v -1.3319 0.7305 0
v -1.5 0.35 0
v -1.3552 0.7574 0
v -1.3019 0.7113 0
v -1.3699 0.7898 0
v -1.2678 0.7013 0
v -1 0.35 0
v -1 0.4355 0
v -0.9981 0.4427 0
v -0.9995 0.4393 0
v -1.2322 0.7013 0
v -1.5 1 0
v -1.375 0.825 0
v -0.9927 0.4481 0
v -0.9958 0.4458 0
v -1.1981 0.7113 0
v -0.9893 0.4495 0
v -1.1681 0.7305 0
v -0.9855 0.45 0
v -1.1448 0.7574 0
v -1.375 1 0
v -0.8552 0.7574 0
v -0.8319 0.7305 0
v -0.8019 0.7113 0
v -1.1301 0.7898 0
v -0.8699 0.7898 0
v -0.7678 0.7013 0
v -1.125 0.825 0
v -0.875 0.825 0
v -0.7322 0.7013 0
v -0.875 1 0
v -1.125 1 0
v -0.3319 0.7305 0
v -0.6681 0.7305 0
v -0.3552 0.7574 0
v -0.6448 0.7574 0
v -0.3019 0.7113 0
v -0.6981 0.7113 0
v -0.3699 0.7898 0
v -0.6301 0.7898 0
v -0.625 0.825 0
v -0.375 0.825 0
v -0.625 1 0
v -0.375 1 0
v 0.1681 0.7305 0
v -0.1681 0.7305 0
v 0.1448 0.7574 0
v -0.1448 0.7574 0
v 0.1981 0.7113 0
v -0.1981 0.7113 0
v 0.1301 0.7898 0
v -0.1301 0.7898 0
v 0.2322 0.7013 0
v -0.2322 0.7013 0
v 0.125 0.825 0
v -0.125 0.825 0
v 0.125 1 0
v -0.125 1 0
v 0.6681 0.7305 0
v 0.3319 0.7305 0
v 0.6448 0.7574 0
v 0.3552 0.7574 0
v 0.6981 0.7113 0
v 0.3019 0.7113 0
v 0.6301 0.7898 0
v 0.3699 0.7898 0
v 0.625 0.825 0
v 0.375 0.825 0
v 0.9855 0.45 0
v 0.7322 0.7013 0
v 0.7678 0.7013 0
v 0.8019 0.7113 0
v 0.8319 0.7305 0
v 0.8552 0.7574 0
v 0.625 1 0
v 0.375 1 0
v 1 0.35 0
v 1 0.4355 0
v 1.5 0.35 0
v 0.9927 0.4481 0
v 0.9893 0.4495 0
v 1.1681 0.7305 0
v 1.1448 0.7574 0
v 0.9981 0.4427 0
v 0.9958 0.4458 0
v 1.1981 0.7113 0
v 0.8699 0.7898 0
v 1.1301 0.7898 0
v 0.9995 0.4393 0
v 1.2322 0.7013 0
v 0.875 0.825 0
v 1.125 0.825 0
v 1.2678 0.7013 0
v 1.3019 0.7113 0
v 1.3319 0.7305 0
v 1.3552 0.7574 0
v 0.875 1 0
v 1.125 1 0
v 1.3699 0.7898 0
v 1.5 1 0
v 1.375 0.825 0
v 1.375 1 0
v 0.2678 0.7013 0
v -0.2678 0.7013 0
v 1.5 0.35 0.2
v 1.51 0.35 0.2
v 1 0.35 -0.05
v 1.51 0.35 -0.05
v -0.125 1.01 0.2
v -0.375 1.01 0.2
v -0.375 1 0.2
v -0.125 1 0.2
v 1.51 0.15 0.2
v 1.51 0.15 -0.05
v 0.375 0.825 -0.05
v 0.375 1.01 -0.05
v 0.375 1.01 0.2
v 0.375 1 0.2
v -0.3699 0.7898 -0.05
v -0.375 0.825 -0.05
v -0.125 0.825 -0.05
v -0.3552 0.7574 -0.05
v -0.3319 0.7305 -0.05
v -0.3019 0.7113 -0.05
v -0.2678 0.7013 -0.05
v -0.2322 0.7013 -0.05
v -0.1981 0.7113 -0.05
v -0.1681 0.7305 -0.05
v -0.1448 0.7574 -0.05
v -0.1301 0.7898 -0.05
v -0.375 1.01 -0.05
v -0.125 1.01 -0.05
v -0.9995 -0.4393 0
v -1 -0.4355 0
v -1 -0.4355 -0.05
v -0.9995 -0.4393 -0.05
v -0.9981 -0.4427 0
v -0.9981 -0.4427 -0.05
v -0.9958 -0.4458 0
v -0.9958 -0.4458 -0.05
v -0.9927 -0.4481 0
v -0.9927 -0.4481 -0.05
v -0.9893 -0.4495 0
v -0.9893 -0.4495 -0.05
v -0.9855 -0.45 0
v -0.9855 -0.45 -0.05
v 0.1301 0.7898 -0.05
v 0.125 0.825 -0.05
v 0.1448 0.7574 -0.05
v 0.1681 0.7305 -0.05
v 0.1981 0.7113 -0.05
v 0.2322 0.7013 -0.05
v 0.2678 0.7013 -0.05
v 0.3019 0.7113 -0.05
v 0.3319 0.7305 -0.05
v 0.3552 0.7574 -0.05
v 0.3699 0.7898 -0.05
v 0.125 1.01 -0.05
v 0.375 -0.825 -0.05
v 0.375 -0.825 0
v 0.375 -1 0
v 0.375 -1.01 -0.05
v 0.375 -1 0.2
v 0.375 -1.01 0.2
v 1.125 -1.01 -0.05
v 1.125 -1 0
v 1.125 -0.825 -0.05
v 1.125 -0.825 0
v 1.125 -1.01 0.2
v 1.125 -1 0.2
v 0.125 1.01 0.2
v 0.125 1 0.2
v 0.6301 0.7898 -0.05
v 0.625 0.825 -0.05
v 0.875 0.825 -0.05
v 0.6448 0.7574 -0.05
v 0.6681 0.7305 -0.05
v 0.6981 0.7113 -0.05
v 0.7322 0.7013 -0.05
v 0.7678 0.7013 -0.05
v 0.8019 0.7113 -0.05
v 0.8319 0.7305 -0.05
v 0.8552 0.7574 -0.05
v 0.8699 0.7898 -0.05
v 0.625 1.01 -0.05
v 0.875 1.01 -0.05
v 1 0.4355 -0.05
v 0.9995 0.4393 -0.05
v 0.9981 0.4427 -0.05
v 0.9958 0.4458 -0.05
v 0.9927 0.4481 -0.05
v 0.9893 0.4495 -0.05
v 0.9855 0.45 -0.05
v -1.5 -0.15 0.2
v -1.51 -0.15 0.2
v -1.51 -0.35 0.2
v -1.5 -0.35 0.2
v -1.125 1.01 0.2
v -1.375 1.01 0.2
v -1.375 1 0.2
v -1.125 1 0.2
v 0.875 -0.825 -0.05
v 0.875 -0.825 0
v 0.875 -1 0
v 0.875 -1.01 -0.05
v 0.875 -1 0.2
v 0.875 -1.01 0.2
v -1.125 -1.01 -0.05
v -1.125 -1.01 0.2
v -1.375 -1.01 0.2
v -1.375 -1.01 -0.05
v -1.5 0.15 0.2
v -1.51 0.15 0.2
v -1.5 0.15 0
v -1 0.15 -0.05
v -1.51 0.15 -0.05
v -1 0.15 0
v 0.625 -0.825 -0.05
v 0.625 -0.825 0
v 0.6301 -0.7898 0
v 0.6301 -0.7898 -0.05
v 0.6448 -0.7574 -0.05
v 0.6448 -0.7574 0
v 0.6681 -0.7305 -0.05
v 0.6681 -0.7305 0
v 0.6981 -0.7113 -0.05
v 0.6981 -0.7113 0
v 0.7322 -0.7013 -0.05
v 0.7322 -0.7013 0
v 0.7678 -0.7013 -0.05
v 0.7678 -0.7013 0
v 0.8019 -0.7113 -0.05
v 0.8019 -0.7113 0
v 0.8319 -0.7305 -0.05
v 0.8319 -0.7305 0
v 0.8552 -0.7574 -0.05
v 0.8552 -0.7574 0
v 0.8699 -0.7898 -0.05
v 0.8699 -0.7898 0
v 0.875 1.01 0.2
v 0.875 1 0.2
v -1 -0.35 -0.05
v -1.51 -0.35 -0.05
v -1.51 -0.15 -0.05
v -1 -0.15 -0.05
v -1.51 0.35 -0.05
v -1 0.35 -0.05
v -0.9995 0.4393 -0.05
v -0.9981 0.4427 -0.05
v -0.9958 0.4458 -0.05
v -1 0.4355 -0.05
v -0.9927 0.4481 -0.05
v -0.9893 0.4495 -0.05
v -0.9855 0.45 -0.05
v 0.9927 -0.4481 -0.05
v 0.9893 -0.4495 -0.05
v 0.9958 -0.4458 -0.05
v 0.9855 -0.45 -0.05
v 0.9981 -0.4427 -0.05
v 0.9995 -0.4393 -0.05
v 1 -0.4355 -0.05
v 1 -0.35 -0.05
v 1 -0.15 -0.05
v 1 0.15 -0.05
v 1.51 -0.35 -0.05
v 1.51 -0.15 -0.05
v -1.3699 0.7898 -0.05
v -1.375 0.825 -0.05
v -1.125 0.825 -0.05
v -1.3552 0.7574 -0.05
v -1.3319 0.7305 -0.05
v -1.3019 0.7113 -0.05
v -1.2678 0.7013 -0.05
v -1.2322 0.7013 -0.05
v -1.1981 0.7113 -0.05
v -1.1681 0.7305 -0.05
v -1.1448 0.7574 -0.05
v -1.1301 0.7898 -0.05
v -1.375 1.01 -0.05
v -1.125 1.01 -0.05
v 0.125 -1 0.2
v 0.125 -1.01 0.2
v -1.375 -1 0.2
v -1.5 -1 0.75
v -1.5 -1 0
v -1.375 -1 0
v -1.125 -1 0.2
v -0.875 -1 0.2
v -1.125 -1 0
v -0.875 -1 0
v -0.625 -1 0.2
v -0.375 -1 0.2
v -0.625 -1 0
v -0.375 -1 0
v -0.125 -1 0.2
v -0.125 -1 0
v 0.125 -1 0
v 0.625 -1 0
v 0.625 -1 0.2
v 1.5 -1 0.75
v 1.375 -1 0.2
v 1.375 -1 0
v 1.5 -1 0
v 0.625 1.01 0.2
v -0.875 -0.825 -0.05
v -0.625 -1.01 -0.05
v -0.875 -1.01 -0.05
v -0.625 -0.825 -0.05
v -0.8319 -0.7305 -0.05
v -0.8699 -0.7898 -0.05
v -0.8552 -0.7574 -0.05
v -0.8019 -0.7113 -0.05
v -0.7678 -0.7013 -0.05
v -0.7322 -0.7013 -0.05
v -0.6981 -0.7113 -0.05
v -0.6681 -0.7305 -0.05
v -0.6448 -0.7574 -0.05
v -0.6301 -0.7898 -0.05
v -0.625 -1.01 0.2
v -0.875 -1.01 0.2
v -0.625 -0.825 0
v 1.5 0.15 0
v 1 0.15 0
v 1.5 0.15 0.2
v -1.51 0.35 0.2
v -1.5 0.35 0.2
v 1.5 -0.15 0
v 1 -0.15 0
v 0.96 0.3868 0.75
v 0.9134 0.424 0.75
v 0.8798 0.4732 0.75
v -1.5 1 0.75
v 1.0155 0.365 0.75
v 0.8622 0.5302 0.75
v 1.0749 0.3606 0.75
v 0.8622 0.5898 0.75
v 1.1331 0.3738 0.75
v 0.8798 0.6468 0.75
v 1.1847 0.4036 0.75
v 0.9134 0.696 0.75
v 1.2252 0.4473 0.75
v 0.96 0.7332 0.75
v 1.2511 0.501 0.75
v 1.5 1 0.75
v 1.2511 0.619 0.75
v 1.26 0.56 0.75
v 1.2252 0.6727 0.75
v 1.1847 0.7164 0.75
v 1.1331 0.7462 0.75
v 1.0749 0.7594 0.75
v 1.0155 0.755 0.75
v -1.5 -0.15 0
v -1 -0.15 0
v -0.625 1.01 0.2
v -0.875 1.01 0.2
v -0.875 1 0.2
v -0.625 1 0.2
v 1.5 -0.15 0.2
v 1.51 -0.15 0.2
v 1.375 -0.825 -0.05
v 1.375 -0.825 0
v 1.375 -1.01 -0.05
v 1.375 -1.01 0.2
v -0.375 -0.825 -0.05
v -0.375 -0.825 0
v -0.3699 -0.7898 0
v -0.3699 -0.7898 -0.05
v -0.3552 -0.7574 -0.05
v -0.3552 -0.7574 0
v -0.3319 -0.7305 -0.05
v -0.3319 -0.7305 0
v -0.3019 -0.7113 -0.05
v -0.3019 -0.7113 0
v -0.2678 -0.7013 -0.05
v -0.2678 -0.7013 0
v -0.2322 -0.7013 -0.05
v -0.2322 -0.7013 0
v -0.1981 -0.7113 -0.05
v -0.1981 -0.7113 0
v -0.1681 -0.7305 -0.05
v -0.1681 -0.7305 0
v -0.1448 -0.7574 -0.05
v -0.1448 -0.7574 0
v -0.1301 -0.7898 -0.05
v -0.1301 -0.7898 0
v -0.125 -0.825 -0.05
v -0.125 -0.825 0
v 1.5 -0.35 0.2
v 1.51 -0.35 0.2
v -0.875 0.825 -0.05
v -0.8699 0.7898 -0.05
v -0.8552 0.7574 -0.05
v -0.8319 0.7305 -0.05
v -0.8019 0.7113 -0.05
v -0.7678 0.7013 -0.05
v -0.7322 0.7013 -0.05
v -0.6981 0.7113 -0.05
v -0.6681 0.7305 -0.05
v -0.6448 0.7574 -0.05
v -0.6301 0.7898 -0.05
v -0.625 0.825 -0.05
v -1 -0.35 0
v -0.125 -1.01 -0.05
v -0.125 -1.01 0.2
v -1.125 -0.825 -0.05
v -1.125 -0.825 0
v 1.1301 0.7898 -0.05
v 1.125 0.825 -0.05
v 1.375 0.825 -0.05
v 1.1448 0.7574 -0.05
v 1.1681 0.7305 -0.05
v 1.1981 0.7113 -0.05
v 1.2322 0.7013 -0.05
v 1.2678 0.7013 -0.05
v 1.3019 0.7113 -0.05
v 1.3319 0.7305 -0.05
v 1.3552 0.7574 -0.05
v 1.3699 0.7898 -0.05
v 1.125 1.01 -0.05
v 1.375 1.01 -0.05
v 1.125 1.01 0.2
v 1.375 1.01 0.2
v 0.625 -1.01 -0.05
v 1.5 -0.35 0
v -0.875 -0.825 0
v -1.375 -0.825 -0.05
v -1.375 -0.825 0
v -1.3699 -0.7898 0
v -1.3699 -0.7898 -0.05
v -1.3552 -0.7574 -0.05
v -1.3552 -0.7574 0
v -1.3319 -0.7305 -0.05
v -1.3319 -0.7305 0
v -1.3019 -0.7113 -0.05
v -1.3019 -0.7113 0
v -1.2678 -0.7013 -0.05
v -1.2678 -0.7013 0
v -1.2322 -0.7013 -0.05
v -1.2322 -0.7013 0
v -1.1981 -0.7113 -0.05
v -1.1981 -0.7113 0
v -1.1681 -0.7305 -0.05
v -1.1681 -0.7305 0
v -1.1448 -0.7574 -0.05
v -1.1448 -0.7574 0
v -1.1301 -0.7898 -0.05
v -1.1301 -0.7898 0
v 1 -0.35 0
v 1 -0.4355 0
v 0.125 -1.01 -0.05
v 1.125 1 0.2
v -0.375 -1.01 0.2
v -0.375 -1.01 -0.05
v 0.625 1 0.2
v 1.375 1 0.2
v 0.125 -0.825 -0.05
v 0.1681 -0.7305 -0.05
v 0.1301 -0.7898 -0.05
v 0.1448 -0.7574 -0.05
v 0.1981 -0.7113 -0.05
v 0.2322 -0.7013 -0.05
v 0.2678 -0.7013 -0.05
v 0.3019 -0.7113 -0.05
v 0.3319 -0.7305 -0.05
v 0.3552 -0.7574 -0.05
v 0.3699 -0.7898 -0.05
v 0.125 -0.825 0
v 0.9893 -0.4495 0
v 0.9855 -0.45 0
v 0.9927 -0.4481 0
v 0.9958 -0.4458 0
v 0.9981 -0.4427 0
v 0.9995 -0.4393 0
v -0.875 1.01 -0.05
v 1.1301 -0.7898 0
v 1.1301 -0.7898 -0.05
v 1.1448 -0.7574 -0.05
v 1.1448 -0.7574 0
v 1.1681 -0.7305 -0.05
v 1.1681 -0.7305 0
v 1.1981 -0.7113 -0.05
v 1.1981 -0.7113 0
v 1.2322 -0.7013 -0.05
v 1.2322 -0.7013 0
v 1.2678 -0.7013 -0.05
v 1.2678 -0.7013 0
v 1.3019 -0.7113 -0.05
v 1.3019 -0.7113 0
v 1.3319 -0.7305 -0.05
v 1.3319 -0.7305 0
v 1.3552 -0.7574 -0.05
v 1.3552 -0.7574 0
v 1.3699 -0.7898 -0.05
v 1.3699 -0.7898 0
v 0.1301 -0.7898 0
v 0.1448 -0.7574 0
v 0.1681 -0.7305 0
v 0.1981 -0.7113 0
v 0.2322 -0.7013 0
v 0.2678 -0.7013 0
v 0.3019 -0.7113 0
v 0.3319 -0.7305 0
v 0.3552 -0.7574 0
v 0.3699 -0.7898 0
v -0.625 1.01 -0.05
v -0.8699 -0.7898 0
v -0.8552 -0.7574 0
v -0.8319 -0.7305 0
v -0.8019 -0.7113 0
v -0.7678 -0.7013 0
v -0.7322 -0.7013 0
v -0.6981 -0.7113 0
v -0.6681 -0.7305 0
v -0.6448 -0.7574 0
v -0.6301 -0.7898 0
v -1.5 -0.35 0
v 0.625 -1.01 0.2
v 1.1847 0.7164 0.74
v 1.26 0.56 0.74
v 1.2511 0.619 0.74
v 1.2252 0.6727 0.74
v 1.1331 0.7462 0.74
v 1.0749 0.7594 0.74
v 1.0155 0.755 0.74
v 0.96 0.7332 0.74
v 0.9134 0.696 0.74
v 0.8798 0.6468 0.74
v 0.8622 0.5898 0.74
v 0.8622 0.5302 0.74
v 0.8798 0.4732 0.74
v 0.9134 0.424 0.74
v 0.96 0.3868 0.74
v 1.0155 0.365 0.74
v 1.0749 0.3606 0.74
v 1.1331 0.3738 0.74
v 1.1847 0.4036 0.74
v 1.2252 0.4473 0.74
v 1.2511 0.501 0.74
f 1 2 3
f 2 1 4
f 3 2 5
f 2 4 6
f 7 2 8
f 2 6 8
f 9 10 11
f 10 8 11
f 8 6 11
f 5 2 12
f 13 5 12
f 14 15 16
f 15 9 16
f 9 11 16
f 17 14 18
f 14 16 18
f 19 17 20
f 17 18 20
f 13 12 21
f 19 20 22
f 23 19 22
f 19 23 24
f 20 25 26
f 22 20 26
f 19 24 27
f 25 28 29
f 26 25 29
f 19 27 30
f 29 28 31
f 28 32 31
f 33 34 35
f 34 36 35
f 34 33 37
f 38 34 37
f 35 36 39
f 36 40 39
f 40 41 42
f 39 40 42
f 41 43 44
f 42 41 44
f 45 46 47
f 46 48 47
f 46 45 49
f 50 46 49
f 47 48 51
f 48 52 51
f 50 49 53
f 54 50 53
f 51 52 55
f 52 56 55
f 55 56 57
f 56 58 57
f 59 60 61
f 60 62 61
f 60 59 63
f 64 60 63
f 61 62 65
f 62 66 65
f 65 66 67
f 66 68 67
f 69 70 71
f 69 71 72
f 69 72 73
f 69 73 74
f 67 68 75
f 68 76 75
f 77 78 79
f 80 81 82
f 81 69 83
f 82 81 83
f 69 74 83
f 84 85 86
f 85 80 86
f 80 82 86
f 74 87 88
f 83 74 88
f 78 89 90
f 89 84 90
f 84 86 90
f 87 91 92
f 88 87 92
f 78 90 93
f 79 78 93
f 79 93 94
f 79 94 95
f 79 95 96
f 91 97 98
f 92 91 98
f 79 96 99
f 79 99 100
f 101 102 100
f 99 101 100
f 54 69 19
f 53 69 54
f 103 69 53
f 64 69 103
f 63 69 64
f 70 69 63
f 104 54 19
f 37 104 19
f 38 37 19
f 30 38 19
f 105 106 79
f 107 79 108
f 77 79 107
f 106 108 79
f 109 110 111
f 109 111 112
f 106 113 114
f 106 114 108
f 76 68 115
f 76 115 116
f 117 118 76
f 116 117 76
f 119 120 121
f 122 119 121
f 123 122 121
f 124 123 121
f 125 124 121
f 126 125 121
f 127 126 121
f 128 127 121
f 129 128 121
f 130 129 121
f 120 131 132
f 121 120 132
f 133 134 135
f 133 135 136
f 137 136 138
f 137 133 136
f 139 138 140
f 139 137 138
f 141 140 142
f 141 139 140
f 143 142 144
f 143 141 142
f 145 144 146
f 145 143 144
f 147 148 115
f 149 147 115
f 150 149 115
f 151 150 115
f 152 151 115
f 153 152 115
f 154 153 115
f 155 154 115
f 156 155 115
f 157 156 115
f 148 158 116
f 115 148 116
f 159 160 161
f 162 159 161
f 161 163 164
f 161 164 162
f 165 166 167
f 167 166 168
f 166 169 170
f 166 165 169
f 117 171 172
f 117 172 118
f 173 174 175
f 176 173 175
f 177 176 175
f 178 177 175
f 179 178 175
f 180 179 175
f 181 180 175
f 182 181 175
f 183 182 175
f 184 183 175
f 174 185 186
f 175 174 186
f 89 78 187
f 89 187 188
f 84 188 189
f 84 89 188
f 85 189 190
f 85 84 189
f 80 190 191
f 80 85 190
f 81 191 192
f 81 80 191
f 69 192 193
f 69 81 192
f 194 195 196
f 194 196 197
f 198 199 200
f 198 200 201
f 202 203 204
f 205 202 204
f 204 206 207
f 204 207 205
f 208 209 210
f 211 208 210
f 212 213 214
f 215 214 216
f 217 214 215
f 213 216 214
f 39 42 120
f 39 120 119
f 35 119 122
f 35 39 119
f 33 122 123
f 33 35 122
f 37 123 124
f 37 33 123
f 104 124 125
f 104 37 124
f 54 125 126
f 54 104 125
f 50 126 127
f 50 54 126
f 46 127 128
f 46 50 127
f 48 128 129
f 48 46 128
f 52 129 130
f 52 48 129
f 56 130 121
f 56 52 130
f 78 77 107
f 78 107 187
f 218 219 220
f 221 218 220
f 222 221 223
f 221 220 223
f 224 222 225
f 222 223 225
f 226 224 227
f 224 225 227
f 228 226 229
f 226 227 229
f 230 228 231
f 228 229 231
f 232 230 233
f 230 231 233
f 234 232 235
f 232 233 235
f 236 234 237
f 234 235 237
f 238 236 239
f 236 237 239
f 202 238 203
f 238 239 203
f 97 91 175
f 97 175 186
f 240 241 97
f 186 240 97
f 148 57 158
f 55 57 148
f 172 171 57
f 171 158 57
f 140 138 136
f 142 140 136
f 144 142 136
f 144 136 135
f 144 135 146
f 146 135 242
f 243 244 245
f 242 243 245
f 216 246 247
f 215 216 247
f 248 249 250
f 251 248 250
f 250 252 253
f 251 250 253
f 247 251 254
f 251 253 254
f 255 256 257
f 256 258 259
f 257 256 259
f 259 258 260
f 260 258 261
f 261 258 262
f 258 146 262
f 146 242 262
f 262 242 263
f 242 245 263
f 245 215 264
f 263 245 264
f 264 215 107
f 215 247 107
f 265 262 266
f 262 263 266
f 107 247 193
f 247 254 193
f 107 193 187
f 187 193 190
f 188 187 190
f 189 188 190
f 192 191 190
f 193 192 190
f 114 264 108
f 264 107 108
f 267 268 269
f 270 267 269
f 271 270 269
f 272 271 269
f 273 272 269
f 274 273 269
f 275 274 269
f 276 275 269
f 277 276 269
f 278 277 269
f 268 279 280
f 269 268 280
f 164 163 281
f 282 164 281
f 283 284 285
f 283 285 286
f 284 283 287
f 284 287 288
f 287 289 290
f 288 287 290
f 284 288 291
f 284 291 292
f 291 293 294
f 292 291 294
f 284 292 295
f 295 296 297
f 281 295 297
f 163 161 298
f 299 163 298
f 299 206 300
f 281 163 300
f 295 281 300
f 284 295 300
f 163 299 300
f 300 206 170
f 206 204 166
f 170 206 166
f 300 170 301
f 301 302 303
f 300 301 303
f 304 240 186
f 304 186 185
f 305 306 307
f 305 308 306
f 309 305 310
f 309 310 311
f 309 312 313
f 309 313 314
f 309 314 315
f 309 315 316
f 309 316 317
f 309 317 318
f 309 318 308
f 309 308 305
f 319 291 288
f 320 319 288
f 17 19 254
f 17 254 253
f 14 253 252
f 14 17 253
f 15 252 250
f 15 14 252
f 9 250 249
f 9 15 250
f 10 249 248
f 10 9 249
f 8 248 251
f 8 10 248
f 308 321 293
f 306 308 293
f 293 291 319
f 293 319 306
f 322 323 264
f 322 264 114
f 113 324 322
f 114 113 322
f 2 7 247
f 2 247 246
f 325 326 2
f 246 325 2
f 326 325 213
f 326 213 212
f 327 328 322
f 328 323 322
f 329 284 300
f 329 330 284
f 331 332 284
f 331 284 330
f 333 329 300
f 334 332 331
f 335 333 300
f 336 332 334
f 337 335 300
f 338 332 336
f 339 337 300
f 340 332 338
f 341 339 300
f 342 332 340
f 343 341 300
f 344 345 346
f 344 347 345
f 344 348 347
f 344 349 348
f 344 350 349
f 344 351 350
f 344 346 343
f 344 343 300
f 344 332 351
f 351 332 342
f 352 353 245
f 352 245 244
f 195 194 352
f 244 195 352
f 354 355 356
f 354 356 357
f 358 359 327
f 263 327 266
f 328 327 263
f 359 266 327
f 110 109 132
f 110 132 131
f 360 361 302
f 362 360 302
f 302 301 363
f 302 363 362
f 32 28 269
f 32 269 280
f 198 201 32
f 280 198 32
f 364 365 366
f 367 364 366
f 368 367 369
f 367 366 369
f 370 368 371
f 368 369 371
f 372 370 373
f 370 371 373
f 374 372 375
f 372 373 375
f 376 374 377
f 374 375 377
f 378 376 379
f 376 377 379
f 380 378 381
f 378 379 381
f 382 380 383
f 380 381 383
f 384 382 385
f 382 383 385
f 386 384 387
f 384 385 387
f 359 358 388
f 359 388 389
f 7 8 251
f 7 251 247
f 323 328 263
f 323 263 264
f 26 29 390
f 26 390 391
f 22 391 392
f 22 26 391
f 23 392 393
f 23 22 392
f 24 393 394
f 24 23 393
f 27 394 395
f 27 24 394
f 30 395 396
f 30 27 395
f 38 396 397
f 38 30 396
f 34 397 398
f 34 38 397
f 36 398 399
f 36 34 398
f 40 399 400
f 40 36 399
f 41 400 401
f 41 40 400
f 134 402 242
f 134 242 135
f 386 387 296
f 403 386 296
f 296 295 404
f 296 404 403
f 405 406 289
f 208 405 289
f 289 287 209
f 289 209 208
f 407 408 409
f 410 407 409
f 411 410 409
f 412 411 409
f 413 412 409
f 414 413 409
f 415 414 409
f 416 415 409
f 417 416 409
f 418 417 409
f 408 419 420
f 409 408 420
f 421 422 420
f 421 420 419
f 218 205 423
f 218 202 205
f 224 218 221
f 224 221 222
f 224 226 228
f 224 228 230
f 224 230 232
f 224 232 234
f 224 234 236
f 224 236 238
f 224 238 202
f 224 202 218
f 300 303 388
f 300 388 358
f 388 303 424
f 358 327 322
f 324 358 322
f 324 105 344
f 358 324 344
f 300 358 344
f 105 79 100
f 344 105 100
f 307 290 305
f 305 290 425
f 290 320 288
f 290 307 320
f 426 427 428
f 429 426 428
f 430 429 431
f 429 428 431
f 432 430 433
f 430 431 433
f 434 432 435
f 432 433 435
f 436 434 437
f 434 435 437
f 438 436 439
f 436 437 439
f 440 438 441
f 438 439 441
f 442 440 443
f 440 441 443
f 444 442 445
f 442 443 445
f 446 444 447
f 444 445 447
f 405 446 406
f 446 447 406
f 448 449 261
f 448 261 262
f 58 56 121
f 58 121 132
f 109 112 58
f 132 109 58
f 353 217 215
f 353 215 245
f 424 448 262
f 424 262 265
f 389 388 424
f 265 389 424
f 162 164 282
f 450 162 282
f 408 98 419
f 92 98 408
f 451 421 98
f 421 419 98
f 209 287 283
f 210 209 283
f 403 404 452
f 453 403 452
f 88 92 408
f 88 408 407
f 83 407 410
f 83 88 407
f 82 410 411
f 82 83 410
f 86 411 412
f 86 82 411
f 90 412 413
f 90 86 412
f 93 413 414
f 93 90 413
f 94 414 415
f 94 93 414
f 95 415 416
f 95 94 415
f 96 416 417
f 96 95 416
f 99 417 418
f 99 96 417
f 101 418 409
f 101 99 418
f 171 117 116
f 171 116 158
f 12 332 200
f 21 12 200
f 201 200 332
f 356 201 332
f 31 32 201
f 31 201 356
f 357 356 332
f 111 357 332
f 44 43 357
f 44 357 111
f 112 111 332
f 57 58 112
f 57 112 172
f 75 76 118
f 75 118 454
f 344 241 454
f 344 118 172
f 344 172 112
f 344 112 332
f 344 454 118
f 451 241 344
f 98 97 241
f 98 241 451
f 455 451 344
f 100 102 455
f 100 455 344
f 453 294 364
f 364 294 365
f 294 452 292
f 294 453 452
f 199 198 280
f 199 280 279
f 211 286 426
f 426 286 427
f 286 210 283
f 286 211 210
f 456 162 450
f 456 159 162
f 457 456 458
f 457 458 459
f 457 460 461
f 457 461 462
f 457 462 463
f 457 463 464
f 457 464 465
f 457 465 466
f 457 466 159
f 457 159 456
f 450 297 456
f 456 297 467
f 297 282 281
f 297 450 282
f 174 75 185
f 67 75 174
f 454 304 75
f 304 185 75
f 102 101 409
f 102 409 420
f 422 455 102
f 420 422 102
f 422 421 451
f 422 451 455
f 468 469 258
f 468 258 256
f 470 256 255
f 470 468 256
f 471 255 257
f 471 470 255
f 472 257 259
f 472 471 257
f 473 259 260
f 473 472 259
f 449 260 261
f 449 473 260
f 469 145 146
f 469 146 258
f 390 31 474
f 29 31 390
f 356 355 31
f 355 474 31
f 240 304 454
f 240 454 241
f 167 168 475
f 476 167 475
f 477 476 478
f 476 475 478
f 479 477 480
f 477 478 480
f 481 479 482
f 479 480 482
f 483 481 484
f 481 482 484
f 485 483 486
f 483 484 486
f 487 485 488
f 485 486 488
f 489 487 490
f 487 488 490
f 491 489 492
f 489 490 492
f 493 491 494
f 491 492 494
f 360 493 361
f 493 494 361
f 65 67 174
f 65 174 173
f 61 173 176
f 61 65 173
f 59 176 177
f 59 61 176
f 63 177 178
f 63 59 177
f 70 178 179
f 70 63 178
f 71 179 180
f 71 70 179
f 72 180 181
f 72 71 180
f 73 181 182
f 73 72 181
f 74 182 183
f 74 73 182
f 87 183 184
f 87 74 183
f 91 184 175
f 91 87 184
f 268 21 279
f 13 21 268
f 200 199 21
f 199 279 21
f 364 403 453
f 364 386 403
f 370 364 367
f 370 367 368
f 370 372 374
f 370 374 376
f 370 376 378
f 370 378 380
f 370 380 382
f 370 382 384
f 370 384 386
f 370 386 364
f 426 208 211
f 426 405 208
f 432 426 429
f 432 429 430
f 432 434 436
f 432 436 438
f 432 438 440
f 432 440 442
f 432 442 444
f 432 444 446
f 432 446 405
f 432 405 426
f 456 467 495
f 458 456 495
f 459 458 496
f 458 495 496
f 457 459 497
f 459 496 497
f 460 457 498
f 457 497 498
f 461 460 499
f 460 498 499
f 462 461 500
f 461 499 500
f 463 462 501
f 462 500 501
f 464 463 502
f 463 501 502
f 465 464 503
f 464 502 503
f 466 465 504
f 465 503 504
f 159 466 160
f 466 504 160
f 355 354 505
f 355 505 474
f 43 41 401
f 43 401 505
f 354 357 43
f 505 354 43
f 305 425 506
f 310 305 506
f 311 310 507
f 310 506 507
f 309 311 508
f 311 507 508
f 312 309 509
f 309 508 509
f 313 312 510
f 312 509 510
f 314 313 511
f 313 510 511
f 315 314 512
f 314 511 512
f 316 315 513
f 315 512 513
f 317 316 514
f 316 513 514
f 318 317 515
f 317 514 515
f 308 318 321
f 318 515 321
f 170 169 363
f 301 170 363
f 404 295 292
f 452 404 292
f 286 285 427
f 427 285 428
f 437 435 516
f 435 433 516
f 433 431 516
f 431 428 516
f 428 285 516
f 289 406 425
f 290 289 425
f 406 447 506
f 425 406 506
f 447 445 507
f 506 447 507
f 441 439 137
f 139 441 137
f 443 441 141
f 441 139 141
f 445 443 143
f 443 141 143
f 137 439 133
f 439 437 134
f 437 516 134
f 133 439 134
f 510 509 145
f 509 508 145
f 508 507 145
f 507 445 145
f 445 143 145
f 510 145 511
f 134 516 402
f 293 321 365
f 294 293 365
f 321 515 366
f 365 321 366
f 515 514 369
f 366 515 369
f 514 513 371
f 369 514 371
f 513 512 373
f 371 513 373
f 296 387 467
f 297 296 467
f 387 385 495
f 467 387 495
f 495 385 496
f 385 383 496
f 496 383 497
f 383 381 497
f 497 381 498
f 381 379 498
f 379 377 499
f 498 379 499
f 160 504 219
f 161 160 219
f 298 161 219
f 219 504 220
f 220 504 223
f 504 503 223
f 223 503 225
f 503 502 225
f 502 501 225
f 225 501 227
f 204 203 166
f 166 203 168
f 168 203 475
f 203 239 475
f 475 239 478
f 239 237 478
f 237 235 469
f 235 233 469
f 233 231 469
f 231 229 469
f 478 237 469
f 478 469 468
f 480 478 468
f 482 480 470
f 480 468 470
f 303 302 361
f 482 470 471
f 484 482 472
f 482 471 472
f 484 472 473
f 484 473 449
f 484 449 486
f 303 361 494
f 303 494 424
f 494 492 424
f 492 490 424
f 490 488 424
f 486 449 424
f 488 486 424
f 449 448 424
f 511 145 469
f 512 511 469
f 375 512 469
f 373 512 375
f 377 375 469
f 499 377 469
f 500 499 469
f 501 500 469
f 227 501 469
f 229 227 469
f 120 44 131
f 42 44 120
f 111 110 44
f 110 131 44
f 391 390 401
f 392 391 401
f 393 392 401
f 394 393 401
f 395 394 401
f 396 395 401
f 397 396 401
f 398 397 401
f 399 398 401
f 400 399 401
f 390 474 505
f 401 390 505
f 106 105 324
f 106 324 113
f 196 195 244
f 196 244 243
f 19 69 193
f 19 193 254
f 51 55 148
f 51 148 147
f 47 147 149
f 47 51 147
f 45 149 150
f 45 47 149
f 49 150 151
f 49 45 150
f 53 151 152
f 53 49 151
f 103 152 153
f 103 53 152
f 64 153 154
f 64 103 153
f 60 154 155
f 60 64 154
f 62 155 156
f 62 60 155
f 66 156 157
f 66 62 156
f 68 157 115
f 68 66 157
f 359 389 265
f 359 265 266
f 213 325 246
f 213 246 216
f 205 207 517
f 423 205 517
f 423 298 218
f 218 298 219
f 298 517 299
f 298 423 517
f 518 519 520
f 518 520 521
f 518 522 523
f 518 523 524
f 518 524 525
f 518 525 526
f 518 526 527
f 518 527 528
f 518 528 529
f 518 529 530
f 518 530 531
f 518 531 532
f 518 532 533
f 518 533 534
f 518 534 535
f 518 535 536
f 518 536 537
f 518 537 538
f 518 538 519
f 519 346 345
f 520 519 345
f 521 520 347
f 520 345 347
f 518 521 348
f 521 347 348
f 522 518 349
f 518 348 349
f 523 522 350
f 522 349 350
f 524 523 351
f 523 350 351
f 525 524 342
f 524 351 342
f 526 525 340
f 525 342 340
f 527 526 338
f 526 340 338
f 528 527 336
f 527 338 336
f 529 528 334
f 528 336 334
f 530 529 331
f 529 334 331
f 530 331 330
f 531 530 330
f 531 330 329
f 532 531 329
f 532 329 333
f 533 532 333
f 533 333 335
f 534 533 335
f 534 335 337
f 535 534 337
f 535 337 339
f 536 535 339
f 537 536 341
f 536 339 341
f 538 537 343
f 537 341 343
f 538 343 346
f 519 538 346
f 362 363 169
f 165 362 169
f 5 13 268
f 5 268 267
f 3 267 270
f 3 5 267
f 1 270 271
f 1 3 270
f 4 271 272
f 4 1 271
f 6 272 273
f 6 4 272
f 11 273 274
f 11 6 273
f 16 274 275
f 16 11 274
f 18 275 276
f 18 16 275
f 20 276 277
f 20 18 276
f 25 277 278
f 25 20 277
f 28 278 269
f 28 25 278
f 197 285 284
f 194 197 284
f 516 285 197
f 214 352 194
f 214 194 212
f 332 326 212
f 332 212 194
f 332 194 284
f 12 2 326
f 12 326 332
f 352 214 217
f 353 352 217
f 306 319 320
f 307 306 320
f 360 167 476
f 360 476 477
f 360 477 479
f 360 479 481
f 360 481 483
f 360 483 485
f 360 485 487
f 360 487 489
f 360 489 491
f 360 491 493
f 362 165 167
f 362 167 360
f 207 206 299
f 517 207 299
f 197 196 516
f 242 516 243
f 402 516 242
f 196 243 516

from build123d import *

# Parameters (mm, degrees)
SKETCH1_W                = 3
SKETCH1_H                = 2
BOSS_EXTRUDE1_DEPTH      = 0.75
SKETCH2_R                = 0.2
CUT_EXTRUDE1_DEPTH       = 0.01
BOSS_EXTRUDE2_DEPTH      = 0.05
BOSS_EXTRUDE2_DEPTH_BACK = 0.2
BOSS_EXTRUDE4_START      = -0.2
BOSS_EXTRUDE4_DEPTH      = 0.25
LPATTERN2_COUNT          = 6
LPATTERN2_PITCH          = 0.5
MIRROR2_START            = -0.2
MIRROR2_COPY_1_DEPTH     = 0.25
MIRROR2_COPY_2_DEPTH     = 0.25
MIRROR2_COPY_3_DEPTH     = 0.25
MIRROR2_COPY_4_DEPTH     = 0.25
MIRROR2_COPY_5_DEPTH     = 0.25


with BuildPart() as part:
    # Sketch1 → Boss-Extrude1 (new body)
    with BuildSketch(Plane.XY):
        Rectangle(SKETCH1_W, SKETCH1_H)
    extrude(amount=BOSS_EXTRUDE1_DEPTH)

    # Sketch2 → Cut-Extrude1 (cut)
    with BuildSketch(Plane.XY.offset(0.75)):
        with Locations((1.06, 0.56)):
            Circle(SKETCH2_R)
    extrude(amount=-CUT_EXTRUDE1_DEPTH, mode=Mode.SUBTRACT)

    # Sketch3 → Boss-Extrude2 (add, two sides: drawn at the far end of the back side and taken through both)
    with BuildSketch(Plane(origin=(0, 0, 0), x_dir=(-1, 0, 0), z_dir=(0, 0, -1)).offset(-BOSS_EXTRUDE2_DEPTH_BACK)):
        with BuildLine():
            Line((1, 0.35), (1.51, 0.35))
            Line((1.51, 0.35), (1.51, 0.15))
            Line((1.51, 0.15), (1, 0.15))
            Line((1, 0.15), (1, -0.15))
            Line((1, -0.15), (1.51, -0.15))
            Line((1.51, -0.15), (1.51, -0.35))
            Line((1.51, -0.35), (1, -0.35))
            Line((1, -0.35), (1, -0.4355))
            ThreePointArc((1, -0.4355), (0.995753048, -0.445753048), (0.9855, -0.45))
            Line((0.9855, -0.45), (-0.9855, -0.45))
            ThreePointArc((-0.9855, -0.45), (-0.995753048, -0.445753048), (-1, -0.4355))
            Line((-1, -0.4355), (-1, -0.35))
            Line((-1, -0.35), (-1.51, -0.35))
            Line((-1.51, -0.35), (-1.51, -0.15))
            Line((-1.51, -0.15), (-1, -0.15))
            Line((-1, -0.15), (-1, 0.15))
            Line((-1, 0.15), (-1.51, 0.15))
            Line((-1.51, 0.15), (-1.51, 0.35))
            Line((-1.51, 0.35), (-1, 0.35))
            Line((-1, 0.35), (-1, 0.4355))
            ThreePointArc((-1, 0.4355), (-0.995753048, 0.445753048), (-0.9855, 0.45))
            Line((-0.9855, 0.45), (0.9855, 0.45))
            ThreePointArc((0.9855, 0.45), (0.995753048, 0.445753048), (1, 0.4355))
            Line((1, 0.4355), (1, 0.35))
        make_face()
    extrude(amount=BOSS_EXTRUDE2_DEPTH + BOSS_EXTRUDE2_DEPTH_BACK)

    # Sketch6 → Boss-Extrude4 (add)
    with BuildSketch(Plane(origin=(0, 0, 0), x_dir=(-1, 0, 0), z_dir=(0, 0, -1)).offset(BOSS_EXTRUDE4_START)):
        with BuildLine():
            Line((-1.375, 1.01), (-1.125, 1.01))
            Line((-1.125, 1.01), (-1.125, 1))
            Line((-1.125, 1), (-1.125, 0.825))
            ThreePointArc((-1.125, 0.825), (-1.25, 0.7), (-1.375, 0.825))
            Line((-1.375, 0.825), (-1.375, 1))
            Line((-1.375, 1), (-1.375, 1.01))
        make_face()
    boss_extrude4 = extrude(amount=BOSS_EXTRUDE4_DEPTH)

    # LPattern2: Boss-Extrude4 ×6
    with Locations(*[(-i * LPATTERN2_PITCH, 0, 0) for i in range(1, LPATTERN2_COUNT)]):
        add(boss_extrude4)

    # Mirror2: Boss-Extrude4 across plane
    add(boss_extrude4.mirror(Plane.ZX))

    # Mirror2 copy 1 sketch → Mirror2 copy 1 (add)
    with BuildSketch(Plane(origin=(-0.5, 0, 0), x_dir=(-1, 0, 0), z_dir=(0, 0, -1)).offset(MIRROR2_START)):
        with BuildLine():
            Line((-1.375, -1.01), (-1.125, -1.01))
            Line((-1.125, -1.01), (-1.125, -1))
            Line((-1.125, -1), (-1.125, -0.825))
            ThreePointArc((-1.125, -0.825), (-1.25, -0.7), (-1.375, -0.825))
            Line((-1.375, -0.825), (-1.375, -1))
            Line((-1.375, -1), (-1.375, -1.01))
        make_face()
    extrude(amount=MIRROR2_COPY_1_DEPTH)

    # Mirror2 copy 2 sketch → Mirror2 copy 2 (add)
    with BuildSketch(Plane(origin=(-1, 0, 0), x_dir=(-1, 0, 0), z_dir=(0, 0, -1)).offset(MIRROR2_START)):
        with BuildLine():
            Line((-1.375, -1.01), (-1.125, -1.01))
            Line((-1.125, -1.01), (-1.125, -1))
            Line((-1.125, -1), (-1.125, -0.825))
            ThreePointArc((-1.125, -0.825), (-1.25, -0.7), (-1.375, -0.825))
            Line((-1.375, -0.825), (-1.375, -1))
            Line((-1.375, -1), (-1.375, -1.01))
        make_face()
    extrude(amount=MIRROR2_COPY_2_DEPTH)

    # Mirror2 copy 3 sketch → Mirror2 copy 3 (add)
    with BuildSketch(Plane(origin=(-1.5, 0, 0), x_dir=(-1, 0, 0), z_dir=(0, 0, -1)).offset(MIRROR2_START)):
        with BuildLine():
            Line((-1.375, -1.01), (-1.125, -1.01))
            Line((-1.125, -1.01), (-1.125, -1))
            Line((-1.125, -1), (-1.125, -0.825))
            ThreePointArc((-1.125, -0.825), (-1.25, -0.7), (-1.375, -0.825))
            Line((-1.375, -0.825), (-1.375, -1))
            Line((-1.375, -1), (-1.375, -1.01))
        make_face()
    extrude(amount=MIRROR2_COPY_3_DEPTH)

    # Mirror2 copy 4 sketch → Mirror2 copy 4 (add)
    with BuildSketch(Plane(origin=(-2, 0, 0), x_dir=(-1, 0, 0), z_dir=(0, 0, -1)).offset(MIRROR2_START)):
        with BuildLine():
            Line((-1.375, -1.01), (-1.125, -1.01))
            Line((-1.125, -1.01), (-1.125, -1))
            Line((-1.125, -1), (-1.125, -0.825))
            ThreePointArc((-1.125, -0.825), (-1.25, -0.7), (-1.375, -0.825))
            Line((-1.375, -0.825), (-1.375, -1))
            Line((-1.375, -1), (-1.375, -1.01))
        make_face()
    extrude(amount=MIRROR2_COPY_4_DEPTH)

    # Mirror2 copy 5 sketch → Mirror2 copy 5 (add)
    with BuildSketch(Plane(origin=(-2.5, 0, 0), x_dir=(-1, 0, 0), z_dir=(0, 0, -1)).offset(MIRROR2_START)):
        with BuildLine():
            Line((-1.375, -1.01), (-1.125, -1.01))
            Line((-1.125, -1.01), (-1.125, -1))
            Line((-1.125, -1), (-1.125, -0.825))
            ThreePointArc((-1.125, -0.825), (-1.25, -0.7), (-1.375, -0.825))
            Line((-1.375, -0.825), (-1.375, -1))
            Line((-1.375, -1), (-1.375, -1.01))
        make_face()
    extrude(amount=MIRROR2_COPY_5_DEPTH)


solid = part.part
